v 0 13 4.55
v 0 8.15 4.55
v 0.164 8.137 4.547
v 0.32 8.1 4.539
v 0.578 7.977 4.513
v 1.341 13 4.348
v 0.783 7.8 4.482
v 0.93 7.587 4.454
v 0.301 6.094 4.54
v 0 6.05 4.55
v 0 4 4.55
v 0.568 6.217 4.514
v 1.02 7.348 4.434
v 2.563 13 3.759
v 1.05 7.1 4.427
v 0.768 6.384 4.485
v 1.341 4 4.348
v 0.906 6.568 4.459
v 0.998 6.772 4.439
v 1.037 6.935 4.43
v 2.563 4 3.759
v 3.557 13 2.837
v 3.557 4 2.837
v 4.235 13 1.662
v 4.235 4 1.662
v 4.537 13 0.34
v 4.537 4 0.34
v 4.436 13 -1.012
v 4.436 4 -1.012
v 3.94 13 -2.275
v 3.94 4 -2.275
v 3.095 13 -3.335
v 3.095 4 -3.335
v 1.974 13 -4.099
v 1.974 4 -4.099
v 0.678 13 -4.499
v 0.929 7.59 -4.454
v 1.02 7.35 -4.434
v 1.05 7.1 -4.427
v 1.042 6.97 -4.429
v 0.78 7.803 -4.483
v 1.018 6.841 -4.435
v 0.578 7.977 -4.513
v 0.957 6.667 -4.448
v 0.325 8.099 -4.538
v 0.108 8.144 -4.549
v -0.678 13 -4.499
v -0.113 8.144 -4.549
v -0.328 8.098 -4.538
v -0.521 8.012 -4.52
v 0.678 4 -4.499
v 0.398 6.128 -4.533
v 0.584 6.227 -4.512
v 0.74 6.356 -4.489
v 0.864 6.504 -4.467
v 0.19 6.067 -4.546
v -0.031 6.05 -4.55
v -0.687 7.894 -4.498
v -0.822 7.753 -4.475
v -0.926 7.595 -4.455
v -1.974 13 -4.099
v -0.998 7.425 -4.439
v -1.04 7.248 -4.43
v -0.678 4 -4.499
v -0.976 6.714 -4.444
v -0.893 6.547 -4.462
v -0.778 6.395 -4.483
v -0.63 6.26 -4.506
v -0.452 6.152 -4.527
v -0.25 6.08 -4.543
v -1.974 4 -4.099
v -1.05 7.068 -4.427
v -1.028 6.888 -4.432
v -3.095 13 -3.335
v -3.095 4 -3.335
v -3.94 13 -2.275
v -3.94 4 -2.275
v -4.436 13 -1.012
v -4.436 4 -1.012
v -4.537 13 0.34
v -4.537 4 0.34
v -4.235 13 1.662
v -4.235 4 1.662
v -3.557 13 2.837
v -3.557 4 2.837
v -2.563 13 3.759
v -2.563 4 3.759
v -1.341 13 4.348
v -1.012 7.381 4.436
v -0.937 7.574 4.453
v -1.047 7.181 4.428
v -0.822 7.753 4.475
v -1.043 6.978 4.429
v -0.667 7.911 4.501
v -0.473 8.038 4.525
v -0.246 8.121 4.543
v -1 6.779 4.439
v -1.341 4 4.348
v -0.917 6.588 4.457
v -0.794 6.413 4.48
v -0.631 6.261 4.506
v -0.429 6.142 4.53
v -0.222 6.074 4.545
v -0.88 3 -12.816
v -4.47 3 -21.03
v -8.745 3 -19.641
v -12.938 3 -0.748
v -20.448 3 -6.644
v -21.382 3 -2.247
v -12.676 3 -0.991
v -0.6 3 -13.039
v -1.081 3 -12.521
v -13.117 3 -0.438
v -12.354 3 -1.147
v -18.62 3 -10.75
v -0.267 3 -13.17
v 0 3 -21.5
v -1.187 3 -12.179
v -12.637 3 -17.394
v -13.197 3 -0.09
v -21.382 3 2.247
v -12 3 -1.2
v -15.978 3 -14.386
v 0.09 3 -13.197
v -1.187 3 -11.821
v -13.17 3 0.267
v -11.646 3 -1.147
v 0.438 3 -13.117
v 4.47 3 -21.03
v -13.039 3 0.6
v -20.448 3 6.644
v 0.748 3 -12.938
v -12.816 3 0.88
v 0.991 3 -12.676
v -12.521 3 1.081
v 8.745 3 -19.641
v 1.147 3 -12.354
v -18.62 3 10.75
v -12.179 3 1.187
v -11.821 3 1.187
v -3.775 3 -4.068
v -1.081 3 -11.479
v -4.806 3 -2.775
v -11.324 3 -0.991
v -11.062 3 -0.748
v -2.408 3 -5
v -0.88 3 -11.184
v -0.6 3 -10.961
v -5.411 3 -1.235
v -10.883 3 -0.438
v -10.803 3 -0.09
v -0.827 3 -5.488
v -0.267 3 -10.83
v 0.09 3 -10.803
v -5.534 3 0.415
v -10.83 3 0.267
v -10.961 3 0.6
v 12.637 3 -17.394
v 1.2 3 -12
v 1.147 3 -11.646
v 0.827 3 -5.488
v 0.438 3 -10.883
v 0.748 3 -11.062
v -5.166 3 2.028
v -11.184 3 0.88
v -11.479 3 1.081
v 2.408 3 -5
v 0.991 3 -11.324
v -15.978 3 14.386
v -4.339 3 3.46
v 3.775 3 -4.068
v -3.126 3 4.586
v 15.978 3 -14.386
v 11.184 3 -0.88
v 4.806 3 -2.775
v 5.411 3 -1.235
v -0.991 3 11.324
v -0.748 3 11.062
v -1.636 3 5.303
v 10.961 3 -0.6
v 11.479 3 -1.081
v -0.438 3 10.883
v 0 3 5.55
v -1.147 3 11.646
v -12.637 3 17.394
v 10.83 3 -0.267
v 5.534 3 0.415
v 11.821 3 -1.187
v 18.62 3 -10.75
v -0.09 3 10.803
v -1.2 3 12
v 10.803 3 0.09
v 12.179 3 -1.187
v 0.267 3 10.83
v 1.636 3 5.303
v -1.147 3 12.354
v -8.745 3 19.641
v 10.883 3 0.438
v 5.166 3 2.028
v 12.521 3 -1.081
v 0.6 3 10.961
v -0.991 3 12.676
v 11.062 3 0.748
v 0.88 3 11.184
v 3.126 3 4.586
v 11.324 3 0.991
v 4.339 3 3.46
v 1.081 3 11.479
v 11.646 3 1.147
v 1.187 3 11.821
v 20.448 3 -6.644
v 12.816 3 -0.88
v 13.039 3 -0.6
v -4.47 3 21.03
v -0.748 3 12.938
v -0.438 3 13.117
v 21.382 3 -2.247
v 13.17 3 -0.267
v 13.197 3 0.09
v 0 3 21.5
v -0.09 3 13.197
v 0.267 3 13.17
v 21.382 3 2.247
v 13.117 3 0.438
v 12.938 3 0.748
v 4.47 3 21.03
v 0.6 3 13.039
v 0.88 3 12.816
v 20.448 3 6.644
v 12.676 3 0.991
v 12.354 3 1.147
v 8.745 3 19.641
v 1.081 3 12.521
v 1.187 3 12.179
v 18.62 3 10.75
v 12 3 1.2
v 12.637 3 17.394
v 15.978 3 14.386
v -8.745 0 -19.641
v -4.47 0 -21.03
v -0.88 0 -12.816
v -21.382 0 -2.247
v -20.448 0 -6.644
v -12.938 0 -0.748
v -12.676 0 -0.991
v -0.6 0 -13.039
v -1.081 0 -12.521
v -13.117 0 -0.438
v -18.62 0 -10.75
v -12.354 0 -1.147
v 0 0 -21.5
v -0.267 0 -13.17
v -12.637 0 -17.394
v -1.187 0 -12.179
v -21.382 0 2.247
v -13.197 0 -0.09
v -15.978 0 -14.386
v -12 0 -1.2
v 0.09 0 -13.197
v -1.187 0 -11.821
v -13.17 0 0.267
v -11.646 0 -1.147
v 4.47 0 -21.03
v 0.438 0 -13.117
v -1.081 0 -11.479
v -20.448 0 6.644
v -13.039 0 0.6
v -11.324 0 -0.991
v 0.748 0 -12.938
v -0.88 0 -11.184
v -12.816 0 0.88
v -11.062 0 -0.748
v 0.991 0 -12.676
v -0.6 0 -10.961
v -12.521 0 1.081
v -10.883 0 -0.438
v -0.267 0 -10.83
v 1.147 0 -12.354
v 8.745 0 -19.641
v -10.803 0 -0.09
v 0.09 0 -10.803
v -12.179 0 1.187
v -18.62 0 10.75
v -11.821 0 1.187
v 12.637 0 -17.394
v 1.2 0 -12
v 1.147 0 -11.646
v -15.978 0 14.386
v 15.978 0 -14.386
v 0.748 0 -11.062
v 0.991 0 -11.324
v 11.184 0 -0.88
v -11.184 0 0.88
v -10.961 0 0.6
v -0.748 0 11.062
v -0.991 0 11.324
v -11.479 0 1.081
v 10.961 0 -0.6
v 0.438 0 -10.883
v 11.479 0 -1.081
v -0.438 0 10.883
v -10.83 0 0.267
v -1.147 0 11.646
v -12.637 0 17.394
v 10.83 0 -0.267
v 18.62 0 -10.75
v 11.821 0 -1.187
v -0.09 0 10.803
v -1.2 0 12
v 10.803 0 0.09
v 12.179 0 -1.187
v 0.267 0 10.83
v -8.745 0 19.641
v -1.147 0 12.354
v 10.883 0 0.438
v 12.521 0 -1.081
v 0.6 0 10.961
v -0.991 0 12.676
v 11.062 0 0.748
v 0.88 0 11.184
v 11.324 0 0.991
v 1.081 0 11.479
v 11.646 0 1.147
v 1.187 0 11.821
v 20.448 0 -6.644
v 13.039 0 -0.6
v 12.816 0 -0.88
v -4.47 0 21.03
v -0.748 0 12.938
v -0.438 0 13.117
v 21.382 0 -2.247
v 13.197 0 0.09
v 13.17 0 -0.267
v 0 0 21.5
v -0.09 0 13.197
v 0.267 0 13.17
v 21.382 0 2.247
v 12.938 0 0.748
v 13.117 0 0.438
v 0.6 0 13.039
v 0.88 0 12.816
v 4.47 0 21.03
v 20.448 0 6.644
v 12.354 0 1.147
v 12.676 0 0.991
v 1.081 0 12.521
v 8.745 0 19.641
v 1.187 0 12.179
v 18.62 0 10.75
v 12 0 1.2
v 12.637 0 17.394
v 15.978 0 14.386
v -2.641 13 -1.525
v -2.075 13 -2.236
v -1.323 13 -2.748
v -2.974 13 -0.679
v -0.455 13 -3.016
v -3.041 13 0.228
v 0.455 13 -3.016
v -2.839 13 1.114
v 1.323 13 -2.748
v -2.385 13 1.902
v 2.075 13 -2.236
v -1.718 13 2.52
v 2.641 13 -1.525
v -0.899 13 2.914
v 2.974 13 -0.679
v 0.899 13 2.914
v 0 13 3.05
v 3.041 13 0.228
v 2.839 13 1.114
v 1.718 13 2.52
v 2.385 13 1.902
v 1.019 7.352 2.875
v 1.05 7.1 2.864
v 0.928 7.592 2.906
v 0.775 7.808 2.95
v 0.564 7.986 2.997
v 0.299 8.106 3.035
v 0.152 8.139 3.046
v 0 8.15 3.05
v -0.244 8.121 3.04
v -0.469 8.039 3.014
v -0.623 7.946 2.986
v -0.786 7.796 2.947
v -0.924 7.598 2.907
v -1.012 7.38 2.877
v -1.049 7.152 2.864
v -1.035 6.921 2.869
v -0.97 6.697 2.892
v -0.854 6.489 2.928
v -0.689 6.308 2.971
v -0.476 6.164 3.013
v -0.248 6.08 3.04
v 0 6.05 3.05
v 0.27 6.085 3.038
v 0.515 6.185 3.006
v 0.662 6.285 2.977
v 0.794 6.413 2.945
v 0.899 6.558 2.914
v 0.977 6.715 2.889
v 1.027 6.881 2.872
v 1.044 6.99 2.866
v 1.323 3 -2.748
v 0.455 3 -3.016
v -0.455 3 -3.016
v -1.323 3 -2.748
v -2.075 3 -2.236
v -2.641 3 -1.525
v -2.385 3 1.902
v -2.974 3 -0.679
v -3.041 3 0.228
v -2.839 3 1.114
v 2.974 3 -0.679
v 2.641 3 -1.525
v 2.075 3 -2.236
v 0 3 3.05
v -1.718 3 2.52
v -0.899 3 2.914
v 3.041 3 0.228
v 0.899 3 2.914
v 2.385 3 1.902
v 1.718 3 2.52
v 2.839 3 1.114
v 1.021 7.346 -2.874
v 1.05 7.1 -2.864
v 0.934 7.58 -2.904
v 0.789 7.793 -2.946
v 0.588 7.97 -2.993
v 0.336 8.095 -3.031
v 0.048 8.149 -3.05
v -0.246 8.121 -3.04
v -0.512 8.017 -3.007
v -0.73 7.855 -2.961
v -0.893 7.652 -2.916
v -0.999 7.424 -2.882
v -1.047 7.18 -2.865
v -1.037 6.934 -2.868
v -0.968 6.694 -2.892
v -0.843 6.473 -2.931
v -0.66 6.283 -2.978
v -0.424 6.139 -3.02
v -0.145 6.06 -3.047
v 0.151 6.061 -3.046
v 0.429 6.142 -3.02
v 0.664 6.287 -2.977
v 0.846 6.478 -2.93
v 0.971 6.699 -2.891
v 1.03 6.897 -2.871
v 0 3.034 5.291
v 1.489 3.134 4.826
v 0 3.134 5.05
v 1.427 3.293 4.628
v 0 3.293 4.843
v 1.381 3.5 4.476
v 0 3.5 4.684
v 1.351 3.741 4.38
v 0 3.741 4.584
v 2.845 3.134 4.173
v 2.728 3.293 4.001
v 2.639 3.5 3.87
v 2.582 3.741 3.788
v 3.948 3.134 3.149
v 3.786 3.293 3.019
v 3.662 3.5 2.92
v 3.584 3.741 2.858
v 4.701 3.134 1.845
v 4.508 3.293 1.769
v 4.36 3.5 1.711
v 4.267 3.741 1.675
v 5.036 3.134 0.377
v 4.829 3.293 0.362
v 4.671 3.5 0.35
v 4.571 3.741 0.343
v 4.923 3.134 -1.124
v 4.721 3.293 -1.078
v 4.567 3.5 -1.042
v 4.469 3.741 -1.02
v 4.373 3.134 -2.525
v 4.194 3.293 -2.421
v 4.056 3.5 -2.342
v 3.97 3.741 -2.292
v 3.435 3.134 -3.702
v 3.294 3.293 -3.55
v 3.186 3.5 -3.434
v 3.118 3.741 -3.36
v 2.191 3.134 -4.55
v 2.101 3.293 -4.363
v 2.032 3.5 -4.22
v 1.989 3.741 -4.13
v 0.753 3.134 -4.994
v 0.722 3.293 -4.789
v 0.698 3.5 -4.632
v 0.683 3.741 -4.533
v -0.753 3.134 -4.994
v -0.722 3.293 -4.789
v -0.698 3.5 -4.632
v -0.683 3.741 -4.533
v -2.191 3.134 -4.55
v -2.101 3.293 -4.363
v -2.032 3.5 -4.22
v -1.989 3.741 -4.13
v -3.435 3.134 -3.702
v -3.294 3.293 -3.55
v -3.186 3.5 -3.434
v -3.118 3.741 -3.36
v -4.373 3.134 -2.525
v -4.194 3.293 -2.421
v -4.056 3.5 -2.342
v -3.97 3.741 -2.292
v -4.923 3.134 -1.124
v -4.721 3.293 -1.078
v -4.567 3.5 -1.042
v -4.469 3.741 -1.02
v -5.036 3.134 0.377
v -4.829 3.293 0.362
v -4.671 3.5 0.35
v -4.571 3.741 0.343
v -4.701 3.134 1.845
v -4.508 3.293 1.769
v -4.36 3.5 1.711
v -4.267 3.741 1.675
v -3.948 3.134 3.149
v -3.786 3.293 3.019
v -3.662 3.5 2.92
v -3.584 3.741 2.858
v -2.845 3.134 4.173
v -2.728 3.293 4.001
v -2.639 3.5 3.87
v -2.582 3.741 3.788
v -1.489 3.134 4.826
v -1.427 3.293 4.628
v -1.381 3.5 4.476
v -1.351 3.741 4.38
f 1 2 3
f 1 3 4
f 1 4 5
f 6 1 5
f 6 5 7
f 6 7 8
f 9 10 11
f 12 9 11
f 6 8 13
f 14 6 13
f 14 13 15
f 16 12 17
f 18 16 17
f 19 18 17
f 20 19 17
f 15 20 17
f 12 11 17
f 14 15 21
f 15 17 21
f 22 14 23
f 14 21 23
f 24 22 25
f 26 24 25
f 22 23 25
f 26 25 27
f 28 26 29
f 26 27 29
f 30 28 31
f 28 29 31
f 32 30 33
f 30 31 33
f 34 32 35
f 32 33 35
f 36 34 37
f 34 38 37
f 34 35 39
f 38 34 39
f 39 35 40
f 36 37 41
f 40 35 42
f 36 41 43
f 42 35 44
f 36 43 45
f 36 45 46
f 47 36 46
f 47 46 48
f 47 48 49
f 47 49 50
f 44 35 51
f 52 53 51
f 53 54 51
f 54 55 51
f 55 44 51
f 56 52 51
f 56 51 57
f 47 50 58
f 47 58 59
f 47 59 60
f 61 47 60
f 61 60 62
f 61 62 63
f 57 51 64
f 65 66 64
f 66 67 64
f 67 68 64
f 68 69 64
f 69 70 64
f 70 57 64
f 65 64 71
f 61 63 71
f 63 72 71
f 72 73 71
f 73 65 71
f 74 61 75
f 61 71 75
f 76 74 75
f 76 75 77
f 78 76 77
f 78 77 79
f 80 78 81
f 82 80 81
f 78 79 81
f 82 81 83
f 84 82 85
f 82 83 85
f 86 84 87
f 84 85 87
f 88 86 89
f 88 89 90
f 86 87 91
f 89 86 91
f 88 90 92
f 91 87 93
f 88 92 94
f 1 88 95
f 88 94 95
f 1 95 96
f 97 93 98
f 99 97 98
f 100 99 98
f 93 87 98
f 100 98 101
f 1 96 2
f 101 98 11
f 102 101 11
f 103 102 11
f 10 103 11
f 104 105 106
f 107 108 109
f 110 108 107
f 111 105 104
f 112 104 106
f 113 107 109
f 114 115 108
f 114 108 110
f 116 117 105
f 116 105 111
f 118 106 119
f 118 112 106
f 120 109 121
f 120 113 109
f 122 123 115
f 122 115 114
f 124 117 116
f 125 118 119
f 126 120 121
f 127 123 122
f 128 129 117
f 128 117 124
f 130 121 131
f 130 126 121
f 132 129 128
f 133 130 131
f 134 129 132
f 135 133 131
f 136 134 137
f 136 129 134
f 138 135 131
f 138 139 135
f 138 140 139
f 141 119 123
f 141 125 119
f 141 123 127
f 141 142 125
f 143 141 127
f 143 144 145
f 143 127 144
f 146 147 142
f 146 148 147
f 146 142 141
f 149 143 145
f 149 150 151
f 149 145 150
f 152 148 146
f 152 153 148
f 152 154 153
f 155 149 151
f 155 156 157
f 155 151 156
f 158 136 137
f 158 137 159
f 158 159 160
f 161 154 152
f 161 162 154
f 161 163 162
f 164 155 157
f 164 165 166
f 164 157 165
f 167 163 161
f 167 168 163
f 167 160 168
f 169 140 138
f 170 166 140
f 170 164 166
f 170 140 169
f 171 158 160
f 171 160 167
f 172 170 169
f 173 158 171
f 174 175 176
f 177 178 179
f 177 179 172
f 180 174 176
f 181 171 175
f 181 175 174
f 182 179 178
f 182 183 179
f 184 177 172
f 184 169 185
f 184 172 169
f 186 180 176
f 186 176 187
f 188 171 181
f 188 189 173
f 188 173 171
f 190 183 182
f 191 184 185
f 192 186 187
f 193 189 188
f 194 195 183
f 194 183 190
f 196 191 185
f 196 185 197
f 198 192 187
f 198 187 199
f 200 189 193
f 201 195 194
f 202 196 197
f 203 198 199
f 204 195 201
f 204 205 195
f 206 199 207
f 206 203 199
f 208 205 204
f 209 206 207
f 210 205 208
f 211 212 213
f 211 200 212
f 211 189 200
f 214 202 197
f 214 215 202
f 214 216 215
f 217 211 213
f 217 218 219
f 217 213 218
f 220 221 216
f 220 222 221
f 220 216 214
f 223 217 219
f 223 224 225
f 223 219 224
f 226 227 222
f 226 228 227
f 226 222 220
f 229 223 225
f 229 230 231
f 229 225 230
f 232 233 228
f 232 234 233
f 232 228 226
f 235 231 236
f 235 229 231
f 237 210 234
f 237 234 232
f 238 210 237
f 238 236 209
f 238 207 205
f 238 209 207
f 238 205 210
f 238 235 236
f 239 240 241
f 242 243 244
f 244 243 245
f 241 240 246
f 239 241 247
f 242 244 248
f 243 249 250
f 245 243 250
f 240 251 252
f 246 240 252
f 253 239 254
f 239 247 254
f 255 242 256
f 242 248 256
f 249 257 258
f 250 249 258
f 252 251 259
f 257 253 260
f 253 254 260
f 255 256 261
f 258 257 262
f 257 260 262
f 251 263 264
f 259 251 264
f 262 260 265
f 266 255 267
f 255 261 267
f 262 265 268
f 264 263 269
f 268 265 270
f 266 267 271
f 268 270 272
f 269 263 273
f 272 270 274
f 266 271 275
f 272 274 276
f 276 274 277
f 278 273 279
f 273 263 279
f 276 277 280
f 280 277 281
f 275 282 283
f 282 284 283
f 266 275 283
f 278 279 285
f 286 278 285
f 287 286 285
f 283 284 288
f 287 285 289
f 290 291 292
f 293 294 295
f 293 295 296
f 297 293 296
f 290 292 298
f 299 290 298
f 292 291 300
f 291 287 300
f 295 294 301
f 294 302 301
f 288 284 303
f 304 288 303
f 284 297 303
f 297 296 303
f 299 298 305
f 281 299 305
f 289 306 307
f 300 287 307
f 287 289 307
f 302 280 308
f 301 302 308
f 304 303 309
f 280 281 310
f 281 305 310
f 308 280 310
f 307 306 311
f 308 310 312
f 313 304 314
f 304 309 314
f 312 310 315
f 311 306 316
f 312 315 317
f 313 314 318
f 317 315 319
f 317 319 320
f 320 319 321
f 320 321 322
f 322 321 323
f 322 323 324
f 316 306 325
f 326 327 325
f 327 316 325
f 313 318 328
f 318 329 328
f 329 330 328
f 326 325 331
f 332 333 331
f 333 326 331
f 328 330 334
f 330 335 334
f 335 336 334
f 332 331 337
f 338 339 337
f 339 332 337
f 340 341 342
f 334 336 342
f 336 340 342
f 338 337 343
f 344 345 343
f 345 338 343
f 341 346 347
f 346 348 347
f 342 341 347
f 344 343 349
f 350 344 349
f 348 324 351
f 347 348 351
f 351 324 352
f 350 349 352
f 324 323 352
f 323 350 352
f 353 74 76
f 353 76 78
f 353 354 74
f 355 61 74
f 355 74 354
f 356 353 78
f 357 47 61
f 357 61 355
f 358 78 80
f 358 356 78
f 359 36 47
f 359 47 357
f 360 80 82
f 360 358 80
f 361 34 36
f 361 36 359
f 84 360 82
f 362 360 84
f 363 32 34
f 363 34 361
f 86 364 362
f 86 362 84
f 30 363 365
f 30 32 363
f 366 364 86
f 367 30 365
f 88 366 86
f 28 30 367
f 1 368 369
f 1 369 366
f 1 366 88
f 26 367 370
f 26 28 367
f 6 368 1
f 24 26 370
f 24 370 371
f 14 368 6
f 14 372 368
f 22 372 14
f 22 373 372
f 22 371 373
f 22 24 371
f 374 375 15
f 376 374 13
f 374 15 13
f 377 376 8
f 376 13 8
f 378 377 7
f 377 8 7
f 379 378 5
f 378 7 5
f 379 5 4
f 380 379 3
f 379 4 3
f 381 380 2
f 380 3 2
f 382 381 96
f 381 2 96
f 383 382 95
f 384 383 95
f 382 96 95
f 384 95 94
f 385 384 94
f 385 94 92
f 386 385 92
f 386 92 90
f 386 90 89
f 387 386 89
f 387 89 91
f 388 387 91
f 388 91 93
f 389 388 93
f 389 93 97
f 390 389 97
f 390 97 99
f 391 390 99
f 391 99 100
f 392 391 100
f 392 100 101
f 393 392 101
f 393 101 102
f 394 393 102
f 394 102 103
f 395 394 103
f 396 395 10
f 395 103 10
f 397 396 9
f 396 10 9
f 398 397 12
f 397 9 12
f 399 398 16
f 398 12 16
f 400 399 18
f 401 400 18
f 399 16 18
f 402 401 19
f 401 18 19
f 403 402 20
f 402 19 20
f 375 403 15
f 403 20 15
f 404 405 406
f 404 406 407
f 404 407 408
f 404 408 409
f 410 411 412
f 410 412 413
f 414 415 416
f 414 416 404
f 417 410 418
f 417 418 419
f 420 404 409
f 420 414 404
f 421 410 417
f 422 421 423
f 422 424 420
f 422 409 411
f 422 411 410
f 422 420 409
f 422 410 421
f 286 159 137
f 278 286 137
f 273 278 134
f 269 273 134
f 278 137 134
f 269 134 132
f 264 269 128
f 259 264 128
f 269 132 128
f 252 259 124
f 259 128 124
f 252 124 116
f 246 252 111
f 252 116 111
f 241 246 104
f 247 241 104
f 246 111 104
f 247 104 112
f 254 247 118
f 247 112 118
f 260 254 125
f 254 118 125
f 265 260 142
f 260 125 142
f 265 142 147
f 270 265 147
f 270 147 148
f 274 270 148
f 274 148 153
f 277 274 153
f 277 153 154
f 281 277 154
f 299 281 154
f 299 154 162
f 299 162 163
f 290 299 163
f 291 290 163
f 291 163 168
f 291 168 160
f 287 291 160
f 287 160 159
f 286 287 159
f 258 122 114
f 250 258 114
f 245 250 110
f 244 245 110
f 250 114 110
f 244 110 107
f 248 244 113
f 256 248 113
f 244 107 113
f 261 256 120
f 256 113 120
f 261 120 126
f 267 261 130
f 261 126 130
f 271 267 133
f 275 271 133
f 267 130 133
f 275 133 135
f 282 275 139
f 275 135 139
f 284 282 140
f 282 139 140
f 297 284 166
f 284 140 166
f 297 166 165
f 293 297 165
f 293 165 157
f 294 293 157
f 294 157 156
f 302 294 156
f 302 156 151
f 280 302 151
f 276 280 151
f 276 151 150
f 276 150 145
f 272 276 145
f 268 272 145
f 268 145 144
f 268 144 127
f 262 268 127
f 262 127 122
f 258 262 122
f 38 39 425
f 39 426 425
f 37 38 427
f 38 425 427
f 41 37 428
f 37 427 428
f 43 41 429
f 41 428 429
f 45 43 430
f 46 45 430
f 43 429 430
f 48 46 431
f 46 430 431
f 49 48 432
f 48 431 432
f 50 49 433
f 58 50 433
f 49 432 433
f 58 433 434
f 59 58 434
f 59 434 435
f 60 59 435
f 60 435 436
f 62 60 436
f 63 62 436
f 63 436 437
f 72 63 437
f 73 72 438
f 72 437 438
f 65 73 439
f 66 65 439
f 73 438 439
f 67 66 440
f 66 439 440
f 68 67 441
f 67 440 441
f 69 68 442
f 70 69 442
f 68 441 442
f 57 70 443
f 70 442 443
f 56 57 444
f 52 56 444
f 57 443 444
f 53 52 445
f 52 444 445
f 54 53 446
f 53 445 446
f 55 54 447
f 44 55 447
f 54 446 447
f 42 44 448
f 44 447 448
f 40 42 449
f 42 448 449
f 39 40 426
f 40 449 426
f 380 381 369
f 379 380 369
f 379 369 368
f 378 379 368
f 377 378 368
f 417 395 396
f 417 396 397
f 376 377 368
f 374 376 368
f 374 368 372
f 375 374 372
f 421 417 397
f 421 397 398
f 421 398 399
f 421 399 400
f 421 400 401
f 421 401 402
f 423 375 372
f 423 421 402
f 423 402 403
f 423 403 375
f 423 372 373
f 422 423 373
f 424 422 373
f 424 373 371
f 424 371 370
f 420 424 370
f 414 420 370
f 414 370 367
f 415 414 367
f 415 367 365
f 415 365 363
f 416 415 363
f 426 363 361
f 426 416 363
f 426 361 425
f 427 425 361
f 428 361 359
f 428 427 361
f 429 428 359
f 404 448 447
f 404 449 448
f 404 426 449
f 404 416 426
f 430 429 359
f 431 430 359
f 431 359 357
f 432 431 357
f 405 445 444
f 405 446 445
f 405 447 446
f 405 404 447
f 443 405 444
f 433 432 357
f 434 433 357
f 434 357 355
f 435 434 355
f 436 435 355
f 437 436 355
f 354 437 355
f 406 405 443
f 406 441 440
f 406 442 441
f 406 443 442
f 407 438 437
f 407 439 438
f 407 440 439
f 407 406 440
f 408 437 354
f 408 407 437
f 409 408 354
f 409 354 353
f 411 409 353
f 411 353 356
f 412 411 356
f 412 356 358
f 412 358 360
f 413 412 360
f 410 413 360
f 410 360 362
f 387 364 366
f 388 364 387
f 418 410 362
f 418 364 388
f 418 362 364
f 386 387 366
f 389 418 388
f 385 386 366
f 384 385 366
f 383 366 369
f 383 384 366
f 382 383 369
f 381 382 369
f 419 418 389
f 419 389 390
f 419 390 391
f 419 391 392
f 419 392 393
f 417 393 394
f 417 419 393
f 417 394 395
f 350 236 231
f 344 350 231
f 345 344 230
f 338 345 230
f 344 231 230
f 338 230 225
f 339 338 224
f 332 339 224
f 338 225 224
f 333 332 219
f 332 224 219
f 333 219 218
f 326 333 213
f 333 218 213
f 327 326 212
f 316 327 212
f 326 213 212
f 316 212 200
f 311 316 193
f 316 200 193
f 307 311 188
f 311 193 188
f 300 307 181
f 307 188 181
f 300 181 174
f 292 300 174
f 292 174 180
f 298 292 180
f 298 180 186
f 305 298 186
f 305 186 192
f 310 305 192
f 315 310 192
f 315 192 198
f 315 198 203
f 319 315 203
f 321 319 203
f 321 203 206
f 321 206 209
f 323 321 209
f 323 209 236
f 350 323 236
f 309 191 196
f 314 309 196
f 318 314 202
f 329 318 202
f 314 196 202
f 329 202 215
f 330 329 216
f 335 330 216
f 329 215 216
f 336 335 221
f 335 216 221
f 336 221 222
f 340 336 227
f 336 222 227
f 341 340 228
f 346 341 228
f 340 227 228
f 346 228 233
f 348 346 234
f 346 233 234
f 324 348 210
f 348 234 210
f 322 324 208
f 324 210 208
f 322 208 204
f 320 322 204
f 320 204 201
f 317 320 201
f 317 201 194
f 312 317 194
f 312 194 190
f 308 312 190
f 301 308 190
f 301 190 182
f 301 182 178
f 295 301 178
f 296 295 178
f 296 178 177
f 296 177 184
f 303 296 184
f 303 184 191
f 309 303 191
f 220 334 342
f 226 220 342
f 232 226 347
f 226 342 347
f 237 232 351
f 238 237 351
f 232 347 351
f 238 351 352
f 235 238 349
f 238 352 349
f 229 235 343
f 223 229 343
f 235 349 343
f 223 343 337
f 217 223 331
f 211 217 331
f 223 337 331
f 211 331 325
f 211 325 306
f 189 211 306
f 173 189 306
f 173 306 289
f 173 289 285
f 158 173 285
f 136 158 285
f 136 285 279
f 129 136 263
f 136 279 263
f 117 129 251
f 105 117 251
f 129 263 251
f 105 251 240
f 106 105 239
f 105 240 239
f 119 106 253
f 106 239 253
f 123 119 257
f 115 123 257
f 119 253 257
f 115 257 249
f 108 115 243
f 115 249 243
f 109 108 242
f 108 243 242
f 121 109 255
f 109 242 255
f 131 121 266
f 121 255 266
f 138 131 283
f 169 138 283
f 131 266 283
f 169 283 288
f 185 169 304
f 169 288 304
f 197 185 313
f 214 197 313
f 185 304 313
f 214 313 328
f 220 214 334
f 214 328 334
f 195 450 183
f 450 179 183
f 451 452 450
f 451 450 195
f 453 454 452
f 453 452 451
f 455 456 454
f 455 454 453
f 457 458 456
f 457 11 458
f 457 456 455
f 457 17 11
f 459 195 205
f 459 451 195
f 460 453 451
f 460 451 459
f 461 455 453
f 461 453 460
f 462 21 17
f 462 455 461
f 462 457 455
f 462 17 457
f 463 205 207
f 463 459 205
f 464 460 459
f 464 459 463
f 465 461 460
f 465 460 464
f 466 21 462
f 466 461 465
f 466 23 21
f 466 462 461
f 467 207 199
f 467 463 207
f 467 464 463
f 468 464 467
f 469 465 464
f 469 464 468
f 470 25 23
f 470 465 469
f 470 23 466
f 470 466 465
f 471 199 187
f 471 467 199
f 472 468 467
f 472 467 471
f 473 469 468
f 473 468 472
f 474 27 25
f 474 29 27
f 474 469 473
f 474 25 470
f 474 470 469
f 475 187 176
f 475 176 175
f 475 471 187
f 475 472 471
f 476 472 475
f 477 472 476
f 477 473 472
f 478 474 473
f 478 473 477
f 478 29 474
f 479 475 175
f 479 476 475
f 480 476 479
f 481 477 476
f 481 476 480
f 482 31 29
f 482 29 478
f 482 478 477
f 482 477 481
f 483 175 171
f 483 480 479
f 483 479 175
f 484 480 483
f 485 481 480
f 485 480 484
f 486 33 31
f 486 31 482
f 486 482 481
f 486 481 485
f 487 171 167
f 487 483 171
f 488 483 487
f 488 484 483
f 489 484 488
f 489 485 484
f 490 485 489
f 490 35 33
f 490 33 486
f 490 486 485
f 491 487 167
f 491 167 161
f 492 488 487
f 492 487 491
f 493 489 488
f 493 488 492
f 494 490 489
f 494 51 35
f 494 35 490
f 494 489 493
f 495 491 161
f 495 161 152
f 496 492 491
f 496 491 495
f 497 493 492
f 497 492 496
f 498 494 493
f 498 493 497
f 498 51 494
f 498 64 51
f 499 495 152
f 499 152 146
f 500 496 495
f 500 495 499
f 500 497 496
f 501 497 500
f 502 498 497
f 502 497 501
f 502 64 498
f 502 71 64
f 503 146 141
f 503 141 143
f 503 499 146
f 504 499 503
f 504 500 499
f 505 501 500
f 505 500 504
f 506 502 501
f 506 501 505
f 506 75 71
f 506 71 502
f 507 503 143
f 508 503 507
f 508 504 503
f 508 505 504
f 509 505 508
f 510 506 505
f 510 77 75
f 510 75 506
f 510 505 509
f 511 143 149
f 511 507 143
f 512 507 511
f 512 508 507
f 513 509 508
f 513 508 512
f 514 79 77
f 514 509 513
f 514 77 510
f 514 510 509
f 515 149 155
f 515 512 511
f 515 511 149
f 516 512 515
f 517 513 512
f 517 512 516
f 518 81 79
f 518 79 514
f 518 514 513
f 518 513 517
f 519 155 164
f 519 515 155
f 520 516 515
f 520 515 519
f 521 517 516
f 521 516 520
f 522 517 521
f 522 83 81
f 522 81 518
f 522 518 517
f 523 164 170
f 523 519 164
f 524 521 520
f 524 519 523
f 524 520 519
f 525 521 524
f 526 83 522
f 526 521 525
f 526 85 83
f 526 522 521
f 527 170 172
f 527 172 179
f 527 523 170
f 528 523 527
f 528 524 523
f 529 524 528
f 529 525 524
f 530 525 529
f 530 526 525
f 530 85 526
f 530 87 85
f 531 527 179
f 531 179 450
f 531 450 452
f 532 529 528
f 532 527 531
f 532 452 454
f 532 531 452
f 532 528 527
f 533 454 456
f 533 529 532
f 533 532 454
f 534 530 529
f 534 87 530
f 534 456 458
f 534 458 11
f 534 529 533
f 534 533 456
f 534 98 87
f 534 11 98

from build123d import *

# Parameters (mm, degrees)
SKETCH_1_R               = 21.5
EXTRUDE_1_DEPTH          = 3
SKETCH_2_R               = 4.55
SKETCH_2_R_2             = 3.05
EXTRUDE_2_DEPTH          = 10
SKETCH_3_R               = 1.05
CUT_EXTRUDE_1_DEPTH      = 8.5
CUT_EXTRUDE_2_REACH      = 34.008
SKETCH_4_R               = 1.2
PATTERN_CIRCULAR_1_COUNT = 4
FILLET_1_R               = 1


with BuildPart() as part:
    # 草图1 → 凸台-拉伸1 (new body)
    with BuildSketch(Plane(origin=(0, 0, 0), x_dir=(1, 0, 0), z_dir=(0, 1, 0))):
        with Locations(Location((0, 0, 0), (0, 0, 270))):
            Circle(SKETCH_1_R)
    extrude(amount=EXTRUDE_1_DEPTH)

    # 草图2 → 凸台-拉伸2 (add)
    with BuildSketch(Plane(origin=(0, 3, 0), x_dir=(1, 0, 0), z_dir=(0, 1, 0))):
        with Locations(Location((0, 0, 0), (0, 0, 270))):
            Circle(SKETCH_2_R)
        with Locations(Location((0, 0, 0), (0, 0, 270))):
            Circle(SKETCH_2_R_2, mode=Mode.SUBTRACT)
    extrude(amount=EXTRUDE_2_DEPTH)

    # 草图3 → 切除-拉伸1 (cut, symmetric)
    with BuildSketch(Plane.XY):
        with Locations((0, 7.1)):
            Circle(SKETCH_3_R)
    extrude(amount=CUT_EXTRUDE_1_DEPTH, both=True, mode=Mode.SUBTRACT)

    # 草图4 → 切除-拉伸2 (cut, up to next)
    with BuildSketch(Plane(origin=(0, 3, 0), x_dir=(1, 0, 0), z_dir=(0, 1, 0)), mode=Mode.PRIVATE) as cut_extrude_2_sk1:
        with Locations(Location((12, 0, 0), (0, 0, 270))):
            Circle(SKETCH_4_R)
    cut_extrude_2_tool1 = extrude(cut_extrude_2_sk1.sketch, amount=-CUT_EXTRUDE_2_REACH, mode=Mode.PRIVATE) & part.part
    cut_extrude_2 = cut_extrude_2_tool1.solids().sort_by_distance((12, 3, 0))[0]
    add(cut_extrude_2, mode=Mode.SUBTRACT)

    # 阵列(圆周)1: 切除-拉伸2 ×4 about axis
    pattern_circular_1_axis = Axis((0, 0, 0), (0, 1, 0))
    for i in range(1, PATTERN_CIRCULAR_1_COUNT):
        add(cut_extrude_2.rotate(pattern_circular_1_axis, i * 360 / PATTERN_CIRCULAR_1_COUNT), mode=Mode.SUBTRACT)

    # 圆角1
    fillet_1_edges = [part.edges().sort_by_distance(p)[0] for p in [
        (0, 3, -4.55),
    ]]
    fillet(fillet_1_edges, radius=FILLET_1_R)


solid = part.part
